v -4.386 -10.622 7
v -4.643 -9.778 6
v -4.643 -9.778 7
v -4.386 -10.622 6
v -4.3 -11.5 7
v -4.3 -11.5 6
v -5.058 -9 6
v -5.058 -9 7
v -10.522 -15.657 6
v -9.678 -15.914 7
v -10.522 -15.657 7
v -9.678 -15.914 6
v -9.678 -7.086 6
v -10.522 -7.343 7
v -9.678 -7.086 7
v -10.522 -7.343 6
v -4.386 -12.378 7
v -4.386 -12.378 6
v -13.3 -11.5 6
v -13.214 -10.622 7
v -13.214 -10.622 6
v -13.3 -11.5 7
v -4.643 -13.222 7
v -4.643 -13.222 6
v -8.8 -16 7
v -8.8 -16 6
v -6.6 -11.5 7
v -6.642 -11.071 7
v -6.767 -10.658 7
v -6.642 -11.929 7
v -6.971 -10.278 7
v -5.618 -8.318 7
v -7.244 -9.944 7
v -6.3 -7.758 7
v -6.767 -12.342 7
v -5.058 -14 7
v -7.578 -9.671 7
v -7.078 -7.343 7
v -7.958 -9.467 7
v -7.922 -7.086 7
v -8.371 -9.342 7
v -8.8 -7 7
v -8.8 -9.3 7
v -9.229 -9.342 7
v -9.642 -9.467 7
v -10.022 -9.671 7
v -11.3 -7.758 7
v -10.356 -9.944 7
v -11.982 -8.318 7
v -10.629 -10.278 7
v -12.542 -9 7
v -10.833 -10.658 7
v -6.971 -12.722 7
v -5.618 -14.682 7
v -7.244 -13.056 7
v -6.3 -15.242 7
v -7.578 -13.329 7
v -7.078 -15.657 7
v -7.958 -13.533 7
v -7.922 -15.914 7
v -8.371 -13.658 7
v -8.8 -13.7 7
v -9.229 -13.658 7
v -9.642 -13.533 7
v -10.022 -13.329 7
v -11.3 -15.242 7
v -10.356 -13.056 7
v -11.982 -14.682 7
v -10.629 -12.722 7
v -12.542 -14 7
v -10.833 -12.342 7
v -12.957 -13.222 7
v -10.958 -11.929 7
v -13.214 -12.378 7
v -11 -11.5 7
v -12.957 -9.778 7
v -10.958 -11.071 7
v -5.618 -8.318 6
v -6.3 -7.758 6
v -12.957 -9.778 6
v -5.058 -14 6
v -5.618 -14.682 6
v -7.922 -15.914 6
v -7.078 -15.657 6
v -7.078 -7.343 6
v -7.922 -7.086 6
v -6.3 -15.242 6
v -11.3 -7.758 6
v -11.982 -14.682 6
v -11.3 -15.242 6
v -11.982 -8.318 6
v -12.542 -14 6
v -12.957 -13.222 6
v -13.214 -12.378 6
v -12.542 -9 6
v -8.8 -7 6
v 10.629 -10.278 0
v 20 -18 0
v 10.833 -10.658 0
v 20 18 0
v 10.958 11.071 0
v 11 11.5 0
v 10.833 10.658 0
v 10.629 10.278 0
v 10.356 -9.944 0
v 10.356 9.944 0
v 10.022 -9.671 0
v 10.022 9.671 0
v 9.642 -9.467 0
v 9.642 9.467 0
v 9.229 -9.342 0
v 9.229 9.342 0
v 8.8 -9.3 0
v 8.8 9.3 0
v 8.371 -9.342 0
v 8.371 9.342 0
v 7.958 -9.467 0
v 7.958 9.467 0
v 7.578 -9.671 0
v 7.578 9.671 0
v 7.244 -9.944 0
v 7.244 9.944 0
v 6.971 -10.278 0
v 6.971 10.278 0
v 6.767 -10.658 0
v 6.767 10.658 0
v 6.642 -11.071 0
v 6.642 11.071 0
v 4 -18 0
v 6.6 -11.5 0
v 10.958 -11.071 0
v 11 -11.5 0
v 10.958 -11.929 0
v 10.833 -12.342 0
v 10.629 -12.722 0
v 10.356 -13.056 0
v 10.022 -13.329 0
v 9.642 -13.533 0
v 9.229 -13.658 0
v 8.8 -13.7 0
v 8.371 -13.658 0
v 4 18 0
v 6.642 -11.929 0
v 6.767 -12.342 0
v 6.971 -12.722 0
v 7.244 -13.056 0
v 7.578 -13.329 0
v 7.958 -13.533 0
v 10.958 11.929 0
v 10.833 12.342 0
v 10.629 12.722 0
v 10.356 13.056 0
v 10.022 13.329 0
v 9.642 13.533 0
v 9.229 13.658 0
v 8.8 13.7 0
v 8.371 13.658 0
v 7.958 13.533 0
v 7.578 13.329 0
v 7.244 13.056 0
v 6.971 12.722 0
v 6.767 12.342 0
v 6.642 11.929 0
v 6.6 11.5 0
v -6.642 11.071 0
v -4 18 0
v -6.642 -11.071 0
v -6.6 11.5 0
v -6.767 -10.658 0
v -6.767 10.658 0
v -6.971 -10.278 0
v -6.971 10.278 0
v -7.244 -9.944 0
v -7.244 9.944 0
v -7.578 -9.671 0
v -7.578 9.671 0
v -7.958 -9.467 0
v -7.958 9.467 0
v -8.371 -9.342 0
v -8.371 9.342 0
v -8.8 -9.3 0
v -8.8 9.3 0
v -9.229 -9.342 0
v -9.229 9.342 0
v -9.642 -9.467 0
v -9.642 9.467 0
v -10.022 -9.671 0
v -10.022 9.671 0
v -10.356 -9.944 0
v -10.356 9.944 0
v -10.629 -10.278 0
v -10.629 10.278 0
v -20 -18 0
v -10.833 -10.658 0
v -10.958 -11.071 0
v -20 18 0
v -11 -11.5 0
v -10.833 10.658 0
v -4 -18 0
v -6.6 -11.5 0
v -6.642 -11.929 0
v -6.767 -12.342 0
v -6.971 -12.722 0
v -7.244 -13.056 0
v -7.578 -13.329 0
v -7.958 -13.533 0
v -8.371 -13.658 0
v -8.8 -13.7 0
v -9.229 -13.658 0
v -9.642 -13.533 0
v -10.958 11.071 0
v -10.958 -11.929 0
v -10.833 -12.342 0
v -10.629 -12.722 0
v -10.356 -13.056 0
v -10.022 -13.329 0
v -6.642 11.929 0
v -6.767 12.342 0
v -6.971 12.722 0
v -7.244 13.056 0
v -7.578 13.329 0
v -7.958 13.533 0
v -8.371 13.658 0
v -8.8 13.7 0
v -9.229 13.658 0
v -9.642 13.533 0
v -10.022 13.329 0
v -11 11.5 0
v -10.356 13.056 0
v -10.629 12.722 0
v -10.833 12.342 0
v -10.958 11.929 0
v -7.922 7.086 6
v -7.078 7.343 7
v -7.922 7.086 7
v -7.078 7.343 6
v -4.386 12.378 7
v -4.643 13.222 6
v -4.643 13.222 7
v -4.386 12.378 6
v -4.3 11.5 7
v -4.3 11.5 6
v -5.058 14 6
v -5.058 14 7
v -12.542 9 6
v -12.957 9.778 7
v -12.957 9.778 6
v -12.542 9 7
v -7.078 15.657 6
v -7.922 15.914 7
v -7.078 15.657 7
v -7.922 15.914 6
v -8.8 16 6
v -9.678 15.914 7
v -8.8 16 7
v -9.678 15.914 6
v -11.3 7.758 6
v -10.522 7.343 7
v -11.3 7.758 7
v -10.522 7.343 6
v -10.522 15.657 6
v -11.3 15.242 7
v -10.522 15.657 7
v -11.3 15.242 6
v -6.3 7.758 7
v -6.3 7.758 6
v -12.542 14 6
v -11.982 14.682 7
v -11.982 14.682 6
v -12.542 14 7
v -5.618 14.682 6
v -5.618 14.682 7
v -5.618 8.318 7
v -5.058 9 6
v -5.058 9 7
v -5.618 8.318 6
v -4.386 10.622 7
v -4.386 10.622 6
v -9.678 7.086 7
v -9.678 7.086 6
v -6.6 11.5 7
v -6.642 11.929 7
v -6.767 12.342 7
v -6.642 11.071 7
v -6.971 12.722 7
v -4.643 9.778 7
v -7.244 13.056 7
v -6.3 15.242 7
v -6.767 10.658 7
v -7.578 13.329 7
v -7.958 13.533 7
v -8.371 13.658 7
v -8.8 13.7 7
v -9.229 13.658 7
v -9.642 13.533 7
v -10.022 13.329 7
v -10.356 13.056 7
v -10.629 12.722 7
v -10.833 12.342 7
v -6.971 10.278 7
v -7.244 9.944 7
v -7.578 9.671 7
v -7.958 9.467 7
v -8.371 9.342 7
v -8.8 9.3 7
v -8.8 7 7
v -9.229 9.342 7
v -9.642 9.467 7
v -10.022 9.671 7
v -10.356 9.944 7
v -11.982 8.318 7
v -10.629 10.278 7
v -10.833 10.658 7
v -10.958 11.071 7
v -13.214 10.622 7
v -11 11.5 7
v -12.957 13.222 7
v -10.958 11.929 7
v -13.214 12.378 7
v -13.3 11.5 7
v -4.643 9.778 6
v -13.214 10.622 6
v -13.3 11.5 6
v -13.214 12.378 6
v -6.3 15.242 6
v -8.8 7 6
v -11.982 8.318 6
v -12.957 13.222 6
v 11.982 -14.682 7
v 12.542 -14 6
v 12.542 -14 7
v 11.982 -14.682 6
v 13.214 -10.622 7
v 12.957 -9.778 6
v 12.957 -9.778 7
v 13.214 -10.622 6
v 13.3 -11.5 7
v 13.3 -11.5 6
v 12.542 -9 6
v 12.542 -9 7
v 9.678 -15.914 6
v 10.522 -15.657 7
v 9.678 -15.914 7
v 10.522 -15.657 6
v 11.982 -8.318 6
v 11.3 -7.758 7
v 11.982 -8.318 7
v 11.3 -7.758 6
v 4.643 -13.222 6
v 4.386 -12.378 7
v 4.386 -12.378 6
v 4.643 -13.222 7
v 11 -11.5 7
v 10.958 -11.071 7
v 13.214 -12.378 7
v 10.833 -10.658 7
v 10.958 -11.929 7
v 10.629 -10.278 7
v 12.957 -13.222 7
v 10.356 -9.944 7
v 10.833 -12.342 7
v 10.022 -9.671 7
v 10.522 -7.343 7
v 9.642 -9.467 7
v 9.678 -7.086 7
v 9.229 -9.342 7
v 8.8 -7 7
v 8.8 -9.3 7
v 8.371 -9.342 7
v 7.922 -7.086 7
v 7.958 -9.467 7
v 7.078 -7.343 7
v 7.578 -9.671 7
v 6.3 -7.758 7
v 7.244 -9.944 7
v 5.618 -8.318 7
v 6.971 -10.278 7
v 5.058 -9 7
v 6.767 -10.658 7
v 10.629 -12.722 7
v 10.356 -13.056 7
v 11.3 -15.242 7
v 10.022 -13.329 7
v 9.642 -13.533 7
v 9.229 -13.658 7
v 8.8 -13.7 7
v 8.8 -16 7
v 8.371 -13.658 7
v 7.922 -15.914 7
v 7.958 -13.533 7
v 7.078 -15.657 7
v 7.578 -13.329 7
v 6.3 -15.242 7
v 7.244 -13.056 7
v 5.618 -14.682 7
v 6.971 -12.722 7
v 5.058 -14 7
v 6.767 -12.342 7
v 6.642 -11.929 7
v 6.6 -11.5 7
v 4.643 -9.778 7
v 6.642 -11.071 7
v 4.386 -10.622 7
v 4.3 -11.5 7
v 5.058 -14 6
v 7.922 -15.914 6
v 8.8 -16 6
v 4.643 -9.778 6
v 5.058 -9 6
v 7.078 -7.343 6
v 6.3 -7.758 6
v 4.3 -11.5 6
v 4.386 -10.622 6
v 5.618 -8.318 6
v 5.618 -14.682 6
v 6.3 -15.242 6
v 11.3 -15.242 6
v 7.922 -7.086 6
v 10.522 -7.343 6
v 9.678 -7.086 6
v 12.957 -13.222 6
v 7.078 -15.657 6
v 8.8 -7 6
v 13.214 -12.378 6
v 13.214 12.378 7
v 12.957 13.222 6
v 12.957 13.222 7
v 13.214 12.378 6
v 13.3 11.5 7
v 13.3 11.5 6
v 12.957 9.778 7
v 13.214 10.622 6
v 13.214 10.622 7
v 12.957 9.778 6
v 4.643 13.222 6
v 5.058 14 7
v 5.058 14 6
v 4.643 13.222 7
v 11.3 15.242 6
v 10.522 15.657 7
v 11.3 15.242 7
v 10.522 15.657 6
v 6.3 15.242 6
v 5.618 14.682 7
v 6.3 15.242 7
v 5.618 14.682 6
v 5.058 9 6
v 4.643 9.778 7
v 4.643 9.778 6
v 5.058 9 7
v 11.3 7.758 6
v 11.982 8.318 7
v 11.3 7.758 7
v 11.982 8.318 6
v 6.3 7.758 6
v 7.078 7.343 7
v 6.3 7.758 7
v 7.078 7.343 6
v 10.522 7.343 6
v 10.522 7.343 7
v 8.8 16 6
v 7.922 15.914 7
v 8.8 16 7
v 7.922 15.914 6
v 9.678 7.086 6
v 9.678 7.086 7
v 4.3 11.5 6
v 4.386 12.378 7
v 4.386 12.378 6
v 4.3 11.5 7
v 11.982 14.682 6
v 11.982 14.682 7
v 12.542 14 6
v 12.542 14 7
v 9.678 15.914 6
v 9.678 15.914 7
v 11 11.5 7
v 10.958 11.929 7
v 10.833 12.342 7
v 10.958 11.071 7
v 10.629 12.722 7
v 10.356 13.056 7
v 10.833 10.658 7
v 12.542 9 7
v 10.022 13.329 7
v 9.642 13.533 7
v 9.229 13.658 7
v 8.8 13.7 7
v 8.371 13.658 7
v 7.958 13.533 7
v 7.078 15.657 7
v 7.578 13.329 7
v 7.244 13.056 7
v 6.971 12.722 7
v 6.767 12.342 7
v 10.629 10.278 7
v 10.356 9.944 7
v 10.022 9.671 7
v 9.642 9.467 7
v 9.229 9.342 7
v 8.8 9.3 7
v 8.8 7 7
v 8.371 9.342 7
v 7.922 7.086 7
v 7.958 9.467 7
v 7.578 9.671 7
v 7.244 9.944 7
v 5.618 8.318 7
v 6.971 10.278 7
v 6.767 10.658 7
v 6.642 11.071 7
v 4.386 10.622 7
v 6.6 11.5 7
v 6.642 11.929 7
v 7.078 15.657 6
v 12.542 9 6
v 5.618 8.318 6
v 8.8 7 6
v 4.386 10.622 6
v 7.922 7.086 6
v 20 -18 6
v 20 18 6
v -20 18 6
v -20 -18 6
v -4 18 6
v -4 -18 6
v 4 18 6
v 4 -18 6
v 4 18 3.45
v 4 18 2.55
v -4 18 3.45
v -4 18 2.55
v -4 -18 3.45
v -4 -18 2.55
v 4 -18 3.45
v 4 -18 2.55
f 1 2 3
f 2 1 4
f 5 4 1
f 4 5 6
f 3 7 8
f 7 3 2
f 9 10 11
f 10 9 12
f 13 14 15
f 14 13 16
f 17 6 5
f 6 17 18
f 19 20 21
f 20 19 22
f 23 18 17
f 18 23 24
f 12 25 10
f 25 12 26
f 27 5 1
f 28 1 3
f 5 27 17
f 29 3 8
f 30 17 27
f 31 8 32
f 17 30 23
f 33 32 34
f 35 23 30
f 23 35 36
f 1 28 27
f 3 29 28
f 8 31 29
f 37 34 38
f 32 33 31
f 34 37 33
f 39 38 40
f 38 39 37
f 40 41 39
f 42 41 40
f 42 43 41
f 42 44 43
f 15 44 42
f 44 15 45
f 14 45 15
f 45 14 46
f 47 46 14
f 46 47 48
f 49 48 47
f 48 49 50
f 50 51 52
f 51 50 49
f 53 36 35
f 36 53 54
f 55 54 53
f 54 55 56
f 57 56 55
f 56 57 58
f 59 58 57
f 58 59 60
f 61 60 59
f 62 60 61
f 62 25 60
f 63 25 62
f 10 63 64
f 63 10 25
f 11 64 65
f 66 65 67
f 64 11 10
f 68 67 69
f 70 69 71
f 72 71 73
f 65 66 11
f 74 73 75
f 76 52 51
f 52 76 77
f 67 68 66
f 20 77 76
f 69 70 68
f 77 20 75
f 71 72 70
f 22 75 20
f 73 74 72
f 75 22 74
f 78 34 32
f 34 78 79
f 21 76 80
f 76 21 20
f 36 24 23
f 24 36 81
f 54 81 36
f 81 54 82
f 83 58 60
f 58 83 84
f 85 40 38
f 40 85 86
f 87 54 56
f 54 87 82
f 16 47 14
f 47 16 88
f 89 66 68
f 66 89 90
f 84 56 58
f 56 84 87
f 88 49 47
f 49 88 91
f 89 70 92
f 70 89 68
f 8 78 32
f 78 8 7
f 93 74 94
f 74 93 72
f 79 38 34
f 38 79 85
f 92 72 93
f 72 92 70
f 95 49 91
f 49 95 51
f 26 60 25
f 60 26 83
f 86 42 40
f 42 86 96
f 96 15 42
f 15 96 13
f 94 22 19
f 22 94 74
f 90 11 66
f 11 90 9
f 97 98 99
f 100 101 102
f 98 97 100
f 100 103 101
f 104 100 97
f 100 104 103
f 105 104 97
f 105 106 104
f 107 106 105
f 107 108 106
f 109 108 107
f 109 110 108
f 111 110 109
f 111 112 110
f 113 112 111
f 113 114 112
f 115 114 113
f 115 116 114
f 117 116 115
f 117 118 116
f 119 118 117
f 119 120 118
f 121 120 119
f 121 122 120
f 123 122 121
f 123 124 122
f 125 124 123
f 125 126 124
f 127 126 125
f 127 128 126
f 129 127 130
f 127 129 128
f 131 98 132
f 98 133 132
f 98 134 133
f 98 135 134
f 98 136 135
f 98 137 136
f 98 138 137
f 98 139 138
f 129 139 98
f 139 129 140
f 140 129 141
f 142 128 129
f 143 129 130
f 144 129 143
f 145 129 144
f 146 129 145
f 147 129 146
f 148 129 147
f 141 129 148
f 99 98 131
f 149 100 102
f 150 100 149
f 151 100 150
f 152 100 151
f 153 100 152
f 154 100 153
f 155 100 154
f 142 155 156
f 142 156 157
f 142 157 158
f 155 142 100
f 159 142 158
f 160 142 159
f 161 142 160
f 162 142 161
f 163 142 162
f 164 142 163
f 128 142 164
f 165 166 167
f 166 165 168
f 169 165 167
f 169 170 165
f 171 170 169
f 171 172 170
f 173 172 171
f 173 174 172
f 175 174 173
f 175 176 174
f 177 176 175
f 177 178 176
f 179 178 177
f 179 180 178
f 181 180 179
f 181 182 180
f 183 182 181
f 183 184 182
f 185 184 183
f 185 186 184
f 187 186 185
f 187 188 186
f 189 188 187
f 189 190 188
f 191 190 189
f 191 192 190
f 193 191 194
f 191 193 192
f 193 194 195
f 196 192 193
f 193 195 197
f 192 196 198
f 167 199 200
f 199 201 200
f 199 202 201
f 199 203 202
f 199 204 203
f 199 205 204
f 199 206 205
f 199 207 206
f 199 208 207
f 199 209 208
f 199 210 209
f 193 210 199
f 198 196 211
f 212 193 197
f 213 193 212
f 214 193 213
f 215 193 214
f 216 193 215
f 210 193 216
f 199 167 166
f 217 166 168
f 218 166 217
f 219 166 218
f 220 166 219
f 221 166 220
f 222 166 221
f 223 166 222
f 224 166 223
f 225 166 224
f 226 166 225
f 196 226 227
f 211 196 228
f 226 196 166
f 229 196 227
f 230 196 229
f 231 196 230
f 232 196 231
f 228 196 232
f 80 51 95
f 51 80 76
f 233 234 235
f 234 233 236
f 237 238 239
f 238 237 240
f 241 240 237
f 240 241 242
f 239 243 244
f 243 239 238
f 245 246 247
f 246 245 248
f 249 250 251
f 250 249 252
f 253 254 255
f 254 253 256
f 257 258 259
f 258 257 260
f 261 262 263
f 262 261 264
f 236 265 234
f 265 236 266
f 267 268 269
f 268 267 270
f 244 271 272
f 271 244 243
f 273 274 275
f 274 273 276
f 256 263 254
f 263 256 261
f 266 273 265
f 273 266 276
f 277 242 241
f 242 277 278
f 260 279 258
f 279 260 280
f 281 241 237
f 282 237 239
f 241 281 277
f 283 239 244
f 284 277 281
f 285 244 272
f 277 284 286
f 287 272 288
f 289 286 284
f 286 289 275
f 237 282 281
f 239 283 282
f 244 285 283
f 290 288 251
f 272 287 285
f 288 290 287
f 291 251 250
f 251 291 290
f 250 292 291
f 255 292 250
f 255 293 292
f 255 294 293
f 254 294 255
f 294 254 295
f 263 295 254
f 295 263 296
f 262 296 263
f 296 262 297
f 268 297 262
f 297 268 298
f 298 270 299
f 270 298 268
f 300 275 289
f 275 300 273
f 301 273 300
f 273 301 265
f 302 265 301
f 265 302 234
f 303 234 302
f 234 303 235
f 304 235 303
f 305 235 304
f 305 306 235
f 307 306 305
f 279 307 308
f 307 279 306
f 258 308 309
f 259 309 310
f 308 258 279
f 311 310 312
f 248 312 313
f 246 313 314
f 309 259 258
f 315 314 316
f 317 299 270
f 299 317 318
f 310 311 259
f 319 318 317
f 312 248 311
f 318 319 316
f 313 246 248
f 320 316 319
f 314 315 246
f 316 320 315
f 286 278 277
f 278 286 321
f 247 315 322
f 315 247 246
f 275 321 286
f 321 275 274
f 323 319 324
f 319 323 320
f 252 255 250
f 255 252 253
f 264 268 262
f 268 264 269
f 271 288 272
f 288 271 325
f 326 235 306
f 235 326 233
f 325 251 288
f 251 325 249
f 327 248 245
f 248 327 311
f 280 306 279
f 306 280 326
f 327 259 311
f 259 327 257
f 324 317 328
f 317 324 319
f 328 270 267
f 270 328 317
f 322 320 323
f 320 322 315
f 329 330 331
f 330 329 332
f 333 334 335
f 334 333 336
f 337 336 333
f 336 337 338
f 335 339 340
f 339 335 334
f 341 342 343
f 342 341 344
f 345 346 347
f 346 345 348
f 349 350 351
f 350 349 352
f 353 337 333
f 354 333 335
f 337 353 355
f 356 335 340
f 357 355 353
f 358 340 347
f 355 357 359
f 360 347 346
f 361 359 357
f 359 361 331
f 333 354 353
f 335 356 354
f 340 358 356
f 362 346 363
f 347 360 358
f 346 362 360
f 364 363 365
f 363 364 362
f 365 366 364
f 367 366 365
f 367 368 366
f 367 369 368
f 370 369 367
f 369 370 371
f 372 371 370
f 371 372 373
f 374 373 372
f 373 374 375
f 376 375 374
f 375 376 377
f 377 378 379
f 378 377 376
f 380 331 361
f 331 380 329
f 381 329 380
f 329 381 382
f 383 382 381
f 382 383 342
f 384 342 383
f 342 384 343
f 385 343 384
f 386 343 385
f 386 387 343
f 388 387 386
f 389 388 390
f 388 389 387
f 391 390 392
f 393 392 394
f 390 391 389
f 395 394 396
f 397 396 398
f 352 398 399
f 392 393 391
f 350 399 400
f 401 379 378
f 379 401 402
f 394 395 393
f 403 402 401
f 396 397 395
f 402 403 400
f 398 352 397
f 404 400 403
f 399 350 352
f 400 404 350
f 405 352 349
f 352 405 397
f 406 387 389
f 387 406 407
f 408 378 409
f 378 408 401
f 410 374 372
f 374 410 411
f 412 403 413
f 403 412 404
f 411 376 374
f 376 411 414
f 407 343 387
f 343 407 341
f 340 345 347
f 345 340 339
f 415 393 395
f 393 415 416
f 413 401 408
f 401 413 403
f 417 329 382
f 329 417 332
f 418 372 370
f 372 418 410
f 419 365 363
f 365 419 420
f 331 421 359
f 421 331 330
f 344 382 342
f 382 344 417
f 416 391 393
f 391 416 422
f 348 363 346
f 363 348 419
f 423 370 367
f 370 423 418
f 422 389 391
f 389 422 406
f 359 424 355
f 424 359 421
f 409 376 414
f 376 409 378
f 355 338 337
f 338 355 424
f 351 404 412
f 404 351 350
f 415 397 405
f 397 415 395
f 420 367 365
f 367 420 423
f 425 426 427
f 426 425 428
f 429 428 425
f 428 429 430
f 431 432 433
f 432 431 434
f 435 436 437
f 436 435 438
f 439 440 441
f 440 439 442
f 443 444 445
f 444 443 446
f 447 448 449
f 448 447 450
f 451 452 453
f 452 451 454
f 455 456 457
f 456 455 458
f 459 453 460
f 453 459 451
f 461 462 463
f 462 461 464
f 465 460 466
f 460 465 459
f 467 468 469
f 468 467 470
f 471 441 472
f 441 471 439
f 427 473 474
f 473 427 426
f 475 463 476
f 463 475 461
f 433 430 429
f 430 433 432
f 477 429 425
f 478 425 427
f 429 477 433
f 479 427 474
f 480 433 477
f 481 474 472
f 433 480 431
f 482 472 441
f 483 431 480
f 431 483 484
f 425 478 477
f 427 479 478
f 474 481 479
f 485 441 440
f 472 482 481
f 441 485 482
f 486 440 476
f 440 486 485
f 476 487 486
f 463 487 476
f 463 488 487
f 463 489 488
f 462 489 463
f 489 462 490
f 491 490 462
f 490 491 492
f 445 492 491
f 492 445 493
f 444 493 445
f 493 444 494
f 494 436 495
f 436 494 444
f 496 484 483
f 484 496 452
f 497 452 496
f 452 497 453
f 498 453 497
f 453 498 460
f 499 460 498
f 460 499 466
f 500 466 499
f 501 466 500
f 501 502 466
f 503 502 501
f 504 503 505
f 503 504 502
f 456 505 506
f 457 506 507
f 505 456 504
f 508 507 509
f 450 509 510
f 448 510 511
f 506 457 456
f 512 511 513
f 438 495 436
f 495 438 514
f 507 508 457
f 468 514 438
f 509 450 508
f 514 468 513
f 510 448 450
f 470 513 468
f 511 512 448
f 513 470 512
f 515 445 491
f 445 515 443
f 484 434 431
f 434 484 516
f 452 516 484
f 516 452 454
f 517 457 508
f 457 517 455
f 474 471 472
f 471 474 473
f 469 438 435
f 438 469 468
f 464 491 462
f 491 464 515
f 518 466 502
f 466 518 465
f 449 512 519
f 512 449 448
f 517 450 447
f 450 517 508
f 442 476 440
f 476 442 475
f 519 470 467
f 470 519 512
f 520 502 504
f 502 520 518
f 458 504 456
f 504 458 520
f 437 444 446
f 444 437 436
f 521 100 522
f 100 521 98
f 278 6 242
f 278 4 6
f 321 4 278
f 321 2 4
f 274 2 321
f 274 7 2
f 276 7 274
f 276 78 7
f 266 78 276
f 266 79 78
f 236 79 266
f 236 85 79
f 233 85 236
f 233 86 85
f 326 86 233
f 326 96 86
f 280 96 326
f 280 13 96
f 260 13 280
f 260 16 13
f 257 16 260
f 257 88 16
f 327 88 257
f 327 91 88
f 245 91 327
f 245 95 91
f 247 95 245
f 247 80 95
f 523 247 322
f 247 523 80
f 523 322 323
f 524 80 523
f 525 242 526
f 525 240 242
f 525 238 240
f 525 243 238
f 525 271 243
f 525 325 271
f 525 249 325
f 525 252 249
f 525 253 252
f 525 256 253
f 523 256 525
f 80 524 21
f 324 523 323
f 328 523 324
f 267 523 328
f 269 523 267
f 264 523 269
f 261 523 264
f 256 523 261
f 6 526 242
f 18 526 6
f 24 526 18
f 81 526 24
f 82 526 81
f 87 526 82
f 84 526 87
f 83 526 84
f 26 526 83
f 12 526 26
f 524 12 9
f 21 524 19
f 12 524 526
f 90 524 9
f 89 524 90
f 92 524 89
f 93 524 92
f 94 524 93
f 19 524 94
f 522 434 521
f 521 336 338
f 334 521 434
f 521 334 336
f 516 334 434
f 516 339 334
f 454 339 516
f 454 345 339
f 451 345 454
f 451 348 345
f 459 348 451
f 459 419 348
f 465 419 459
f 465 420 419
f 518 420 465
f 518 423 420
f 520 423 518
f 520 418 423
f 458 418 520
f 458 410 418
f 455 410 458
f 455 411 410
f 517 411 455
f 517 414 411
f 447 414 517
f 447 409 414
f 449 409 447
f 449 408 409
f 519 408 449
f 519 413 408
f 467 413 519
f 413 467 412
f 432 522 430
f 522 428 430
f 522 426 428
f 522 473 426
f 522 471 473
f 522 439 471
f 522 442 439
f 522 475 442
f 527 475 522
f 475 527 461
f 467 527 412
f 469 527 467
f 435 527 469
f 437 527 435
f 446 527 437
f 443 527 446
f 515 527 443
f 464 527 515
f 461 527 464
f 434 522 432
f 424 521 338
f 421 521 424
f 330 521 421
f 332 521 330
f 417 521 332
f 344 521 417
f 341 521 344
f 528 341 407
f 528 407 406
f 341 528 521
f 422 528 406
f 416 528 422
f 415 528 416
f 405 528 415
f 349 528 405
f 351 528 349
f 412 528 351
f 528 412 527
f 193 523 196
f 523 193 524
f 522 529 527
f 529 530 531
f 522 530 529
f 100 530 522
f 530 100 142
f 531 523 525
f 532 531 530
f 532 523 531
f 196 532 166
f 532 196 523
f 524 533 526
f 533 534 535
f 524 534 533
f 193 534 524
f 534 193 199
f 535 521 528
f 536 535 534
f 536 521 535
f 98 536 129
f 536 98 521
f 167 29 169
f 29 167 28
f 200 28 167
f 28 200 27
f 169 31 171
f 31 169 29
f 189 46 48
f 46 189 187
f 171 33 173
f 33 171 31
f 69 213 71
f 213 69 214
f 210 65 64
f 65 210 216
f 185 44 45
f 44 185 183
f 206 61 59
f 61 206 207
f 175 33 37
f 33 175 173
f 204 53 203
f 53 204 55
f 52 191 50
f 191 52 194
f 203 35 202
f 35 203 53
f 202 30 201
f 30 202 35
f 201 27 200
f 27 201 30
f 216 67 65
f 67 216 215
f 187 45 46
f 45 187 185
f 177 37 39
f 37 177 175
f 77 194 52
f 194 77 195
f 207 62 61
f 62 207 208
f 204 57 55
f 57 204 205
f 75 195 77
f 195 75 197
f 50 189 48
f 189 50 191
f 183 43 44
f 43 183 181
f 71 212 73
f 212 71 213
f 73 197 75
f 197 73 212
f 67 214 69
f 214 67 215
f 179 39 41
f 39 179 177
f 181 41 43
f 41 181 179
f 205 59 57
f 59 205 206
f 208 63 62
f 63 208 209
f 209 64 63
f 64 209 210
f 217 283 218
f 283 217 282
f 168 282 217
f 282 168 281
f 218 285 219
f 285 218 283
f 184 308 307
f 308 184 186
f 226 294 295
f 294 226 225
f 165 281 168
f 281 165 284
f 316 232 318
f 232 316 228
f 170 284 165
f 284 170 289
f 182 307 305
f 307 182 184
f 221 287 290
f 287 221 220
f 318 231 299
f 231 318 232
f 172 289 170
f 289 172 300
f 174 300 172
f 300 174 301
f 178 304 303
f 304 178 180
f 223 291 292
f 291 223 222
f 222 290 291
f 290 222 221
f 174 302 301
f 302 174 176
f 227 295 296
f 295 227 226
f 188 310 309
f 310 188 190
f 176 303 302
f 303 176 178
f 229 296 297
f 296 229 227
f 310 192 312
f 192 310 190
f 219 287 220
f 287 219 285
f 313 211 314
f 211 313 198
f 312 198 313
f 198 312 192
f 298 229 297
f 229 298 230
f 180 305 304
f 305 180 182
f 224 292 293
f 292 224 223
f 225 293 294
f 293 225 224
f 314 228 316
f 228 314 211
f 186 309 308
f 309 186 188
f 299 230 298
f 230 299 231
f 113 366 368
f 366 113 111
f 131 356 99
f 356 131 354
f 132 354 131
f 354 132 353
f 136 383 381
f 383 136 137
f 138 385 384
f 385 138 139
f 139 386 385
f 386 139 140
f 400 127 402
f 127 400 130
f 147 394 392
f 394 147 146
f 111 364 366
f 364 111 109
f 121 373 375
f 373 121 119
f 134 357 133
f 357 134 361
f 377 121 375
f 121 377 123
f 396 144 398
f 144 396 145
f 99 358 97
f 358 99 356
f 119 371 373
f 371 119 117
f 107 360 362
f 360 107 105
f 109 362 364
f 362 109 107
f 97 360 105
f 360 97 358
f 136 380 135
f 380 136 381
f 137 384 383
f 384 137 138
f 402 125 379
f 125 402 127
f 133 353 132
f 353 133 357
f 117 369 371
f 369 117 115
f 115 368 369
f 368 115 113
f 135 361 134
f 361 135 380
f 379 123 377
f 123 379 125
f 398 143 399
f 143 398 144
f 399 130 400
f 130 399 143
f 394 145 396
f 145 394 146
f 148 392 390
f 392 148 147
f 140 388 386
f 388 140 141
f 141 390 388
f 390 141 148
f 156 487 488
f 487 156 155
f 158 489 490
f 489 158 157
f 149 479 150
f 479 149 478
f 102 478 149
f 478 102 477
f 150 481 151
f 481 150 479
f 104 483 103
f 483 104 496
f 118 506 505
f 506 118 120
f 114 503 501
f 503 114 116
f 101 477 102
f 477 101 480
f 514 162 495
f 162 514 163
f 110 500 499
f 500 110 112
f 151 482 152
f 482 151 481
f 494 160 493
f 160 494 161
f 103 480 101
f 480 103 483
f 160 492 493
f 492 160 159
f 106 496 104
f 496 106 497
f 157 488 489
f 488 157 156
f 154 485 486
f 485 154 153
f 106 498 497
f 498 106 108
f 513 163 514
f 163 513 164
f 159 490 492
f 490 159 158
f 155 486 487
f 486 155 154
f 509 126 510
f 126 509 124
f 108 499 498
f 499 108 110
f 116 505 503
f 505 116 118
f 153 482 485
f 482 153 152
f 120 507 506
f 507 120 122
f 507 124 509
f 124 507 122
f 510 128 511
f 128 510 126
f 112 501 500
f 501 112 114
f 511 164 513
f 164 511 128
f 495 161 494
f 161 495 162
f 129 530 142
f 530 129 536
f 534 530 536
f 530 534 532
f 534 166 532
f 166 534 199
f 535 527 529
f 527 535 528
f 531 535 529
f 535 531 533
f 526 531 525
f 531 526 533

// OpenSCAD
$fn = 32;

// ----------------------------------------------------------------------
// Living hinge: 40 x 36 mm plates, 0.9 mm flexible web
// ----------------------------------------------------------------------

// --- parameters (mm) ---
plate_len = 16;           // plate length outside the web
plate_w = 36;             // plate width
thick = 6;                // plate thickness
web_half = 4;             // half width of the flex band
web_t = 0.9;              // flexible web thickness
web_z = 2.55;             // web position inside the thickness
boss_d = 9;               // screw boss diameter
boss_h = 7;               // screw boss height
boss_x = 8.8;             // screw boss distance from the web
screw_d = 4.4;            // screw hole

difference() {
  union() {
    /* one flat strip, later thinned at the middle */
    translate([-20, -18, 0]) cube([40, 36, 6]);
    /* screw bosses, sunk 0.5 mm into the plates */
    for (sx = [-8.8, 8.8]) {
      for (sy = [-11.5, 11.5]) {
        translate([sx, sy, 0]) cylinder(h = boss_h, d = boss_d);
      }
    }
  }
  /* channel from below: leaves the web on top of it */
  translate([-4, -20.5, -2.5]) cube([8, 41, 5.05]);
  /* channel from above: thins the web down to web_t */
  translate([-4, -20.5, 3.45]) cube([8, 41, 5.05]);
  /* screw holes through the bosses */
  for (sx = [-8.8, 8.8]) {
    for (sy = [-11.5, 11.5]) {
      translate([sx, sy, -2.5]) cylinder(h = boss_h + 5, d = screw_d);
    }
  }
}
